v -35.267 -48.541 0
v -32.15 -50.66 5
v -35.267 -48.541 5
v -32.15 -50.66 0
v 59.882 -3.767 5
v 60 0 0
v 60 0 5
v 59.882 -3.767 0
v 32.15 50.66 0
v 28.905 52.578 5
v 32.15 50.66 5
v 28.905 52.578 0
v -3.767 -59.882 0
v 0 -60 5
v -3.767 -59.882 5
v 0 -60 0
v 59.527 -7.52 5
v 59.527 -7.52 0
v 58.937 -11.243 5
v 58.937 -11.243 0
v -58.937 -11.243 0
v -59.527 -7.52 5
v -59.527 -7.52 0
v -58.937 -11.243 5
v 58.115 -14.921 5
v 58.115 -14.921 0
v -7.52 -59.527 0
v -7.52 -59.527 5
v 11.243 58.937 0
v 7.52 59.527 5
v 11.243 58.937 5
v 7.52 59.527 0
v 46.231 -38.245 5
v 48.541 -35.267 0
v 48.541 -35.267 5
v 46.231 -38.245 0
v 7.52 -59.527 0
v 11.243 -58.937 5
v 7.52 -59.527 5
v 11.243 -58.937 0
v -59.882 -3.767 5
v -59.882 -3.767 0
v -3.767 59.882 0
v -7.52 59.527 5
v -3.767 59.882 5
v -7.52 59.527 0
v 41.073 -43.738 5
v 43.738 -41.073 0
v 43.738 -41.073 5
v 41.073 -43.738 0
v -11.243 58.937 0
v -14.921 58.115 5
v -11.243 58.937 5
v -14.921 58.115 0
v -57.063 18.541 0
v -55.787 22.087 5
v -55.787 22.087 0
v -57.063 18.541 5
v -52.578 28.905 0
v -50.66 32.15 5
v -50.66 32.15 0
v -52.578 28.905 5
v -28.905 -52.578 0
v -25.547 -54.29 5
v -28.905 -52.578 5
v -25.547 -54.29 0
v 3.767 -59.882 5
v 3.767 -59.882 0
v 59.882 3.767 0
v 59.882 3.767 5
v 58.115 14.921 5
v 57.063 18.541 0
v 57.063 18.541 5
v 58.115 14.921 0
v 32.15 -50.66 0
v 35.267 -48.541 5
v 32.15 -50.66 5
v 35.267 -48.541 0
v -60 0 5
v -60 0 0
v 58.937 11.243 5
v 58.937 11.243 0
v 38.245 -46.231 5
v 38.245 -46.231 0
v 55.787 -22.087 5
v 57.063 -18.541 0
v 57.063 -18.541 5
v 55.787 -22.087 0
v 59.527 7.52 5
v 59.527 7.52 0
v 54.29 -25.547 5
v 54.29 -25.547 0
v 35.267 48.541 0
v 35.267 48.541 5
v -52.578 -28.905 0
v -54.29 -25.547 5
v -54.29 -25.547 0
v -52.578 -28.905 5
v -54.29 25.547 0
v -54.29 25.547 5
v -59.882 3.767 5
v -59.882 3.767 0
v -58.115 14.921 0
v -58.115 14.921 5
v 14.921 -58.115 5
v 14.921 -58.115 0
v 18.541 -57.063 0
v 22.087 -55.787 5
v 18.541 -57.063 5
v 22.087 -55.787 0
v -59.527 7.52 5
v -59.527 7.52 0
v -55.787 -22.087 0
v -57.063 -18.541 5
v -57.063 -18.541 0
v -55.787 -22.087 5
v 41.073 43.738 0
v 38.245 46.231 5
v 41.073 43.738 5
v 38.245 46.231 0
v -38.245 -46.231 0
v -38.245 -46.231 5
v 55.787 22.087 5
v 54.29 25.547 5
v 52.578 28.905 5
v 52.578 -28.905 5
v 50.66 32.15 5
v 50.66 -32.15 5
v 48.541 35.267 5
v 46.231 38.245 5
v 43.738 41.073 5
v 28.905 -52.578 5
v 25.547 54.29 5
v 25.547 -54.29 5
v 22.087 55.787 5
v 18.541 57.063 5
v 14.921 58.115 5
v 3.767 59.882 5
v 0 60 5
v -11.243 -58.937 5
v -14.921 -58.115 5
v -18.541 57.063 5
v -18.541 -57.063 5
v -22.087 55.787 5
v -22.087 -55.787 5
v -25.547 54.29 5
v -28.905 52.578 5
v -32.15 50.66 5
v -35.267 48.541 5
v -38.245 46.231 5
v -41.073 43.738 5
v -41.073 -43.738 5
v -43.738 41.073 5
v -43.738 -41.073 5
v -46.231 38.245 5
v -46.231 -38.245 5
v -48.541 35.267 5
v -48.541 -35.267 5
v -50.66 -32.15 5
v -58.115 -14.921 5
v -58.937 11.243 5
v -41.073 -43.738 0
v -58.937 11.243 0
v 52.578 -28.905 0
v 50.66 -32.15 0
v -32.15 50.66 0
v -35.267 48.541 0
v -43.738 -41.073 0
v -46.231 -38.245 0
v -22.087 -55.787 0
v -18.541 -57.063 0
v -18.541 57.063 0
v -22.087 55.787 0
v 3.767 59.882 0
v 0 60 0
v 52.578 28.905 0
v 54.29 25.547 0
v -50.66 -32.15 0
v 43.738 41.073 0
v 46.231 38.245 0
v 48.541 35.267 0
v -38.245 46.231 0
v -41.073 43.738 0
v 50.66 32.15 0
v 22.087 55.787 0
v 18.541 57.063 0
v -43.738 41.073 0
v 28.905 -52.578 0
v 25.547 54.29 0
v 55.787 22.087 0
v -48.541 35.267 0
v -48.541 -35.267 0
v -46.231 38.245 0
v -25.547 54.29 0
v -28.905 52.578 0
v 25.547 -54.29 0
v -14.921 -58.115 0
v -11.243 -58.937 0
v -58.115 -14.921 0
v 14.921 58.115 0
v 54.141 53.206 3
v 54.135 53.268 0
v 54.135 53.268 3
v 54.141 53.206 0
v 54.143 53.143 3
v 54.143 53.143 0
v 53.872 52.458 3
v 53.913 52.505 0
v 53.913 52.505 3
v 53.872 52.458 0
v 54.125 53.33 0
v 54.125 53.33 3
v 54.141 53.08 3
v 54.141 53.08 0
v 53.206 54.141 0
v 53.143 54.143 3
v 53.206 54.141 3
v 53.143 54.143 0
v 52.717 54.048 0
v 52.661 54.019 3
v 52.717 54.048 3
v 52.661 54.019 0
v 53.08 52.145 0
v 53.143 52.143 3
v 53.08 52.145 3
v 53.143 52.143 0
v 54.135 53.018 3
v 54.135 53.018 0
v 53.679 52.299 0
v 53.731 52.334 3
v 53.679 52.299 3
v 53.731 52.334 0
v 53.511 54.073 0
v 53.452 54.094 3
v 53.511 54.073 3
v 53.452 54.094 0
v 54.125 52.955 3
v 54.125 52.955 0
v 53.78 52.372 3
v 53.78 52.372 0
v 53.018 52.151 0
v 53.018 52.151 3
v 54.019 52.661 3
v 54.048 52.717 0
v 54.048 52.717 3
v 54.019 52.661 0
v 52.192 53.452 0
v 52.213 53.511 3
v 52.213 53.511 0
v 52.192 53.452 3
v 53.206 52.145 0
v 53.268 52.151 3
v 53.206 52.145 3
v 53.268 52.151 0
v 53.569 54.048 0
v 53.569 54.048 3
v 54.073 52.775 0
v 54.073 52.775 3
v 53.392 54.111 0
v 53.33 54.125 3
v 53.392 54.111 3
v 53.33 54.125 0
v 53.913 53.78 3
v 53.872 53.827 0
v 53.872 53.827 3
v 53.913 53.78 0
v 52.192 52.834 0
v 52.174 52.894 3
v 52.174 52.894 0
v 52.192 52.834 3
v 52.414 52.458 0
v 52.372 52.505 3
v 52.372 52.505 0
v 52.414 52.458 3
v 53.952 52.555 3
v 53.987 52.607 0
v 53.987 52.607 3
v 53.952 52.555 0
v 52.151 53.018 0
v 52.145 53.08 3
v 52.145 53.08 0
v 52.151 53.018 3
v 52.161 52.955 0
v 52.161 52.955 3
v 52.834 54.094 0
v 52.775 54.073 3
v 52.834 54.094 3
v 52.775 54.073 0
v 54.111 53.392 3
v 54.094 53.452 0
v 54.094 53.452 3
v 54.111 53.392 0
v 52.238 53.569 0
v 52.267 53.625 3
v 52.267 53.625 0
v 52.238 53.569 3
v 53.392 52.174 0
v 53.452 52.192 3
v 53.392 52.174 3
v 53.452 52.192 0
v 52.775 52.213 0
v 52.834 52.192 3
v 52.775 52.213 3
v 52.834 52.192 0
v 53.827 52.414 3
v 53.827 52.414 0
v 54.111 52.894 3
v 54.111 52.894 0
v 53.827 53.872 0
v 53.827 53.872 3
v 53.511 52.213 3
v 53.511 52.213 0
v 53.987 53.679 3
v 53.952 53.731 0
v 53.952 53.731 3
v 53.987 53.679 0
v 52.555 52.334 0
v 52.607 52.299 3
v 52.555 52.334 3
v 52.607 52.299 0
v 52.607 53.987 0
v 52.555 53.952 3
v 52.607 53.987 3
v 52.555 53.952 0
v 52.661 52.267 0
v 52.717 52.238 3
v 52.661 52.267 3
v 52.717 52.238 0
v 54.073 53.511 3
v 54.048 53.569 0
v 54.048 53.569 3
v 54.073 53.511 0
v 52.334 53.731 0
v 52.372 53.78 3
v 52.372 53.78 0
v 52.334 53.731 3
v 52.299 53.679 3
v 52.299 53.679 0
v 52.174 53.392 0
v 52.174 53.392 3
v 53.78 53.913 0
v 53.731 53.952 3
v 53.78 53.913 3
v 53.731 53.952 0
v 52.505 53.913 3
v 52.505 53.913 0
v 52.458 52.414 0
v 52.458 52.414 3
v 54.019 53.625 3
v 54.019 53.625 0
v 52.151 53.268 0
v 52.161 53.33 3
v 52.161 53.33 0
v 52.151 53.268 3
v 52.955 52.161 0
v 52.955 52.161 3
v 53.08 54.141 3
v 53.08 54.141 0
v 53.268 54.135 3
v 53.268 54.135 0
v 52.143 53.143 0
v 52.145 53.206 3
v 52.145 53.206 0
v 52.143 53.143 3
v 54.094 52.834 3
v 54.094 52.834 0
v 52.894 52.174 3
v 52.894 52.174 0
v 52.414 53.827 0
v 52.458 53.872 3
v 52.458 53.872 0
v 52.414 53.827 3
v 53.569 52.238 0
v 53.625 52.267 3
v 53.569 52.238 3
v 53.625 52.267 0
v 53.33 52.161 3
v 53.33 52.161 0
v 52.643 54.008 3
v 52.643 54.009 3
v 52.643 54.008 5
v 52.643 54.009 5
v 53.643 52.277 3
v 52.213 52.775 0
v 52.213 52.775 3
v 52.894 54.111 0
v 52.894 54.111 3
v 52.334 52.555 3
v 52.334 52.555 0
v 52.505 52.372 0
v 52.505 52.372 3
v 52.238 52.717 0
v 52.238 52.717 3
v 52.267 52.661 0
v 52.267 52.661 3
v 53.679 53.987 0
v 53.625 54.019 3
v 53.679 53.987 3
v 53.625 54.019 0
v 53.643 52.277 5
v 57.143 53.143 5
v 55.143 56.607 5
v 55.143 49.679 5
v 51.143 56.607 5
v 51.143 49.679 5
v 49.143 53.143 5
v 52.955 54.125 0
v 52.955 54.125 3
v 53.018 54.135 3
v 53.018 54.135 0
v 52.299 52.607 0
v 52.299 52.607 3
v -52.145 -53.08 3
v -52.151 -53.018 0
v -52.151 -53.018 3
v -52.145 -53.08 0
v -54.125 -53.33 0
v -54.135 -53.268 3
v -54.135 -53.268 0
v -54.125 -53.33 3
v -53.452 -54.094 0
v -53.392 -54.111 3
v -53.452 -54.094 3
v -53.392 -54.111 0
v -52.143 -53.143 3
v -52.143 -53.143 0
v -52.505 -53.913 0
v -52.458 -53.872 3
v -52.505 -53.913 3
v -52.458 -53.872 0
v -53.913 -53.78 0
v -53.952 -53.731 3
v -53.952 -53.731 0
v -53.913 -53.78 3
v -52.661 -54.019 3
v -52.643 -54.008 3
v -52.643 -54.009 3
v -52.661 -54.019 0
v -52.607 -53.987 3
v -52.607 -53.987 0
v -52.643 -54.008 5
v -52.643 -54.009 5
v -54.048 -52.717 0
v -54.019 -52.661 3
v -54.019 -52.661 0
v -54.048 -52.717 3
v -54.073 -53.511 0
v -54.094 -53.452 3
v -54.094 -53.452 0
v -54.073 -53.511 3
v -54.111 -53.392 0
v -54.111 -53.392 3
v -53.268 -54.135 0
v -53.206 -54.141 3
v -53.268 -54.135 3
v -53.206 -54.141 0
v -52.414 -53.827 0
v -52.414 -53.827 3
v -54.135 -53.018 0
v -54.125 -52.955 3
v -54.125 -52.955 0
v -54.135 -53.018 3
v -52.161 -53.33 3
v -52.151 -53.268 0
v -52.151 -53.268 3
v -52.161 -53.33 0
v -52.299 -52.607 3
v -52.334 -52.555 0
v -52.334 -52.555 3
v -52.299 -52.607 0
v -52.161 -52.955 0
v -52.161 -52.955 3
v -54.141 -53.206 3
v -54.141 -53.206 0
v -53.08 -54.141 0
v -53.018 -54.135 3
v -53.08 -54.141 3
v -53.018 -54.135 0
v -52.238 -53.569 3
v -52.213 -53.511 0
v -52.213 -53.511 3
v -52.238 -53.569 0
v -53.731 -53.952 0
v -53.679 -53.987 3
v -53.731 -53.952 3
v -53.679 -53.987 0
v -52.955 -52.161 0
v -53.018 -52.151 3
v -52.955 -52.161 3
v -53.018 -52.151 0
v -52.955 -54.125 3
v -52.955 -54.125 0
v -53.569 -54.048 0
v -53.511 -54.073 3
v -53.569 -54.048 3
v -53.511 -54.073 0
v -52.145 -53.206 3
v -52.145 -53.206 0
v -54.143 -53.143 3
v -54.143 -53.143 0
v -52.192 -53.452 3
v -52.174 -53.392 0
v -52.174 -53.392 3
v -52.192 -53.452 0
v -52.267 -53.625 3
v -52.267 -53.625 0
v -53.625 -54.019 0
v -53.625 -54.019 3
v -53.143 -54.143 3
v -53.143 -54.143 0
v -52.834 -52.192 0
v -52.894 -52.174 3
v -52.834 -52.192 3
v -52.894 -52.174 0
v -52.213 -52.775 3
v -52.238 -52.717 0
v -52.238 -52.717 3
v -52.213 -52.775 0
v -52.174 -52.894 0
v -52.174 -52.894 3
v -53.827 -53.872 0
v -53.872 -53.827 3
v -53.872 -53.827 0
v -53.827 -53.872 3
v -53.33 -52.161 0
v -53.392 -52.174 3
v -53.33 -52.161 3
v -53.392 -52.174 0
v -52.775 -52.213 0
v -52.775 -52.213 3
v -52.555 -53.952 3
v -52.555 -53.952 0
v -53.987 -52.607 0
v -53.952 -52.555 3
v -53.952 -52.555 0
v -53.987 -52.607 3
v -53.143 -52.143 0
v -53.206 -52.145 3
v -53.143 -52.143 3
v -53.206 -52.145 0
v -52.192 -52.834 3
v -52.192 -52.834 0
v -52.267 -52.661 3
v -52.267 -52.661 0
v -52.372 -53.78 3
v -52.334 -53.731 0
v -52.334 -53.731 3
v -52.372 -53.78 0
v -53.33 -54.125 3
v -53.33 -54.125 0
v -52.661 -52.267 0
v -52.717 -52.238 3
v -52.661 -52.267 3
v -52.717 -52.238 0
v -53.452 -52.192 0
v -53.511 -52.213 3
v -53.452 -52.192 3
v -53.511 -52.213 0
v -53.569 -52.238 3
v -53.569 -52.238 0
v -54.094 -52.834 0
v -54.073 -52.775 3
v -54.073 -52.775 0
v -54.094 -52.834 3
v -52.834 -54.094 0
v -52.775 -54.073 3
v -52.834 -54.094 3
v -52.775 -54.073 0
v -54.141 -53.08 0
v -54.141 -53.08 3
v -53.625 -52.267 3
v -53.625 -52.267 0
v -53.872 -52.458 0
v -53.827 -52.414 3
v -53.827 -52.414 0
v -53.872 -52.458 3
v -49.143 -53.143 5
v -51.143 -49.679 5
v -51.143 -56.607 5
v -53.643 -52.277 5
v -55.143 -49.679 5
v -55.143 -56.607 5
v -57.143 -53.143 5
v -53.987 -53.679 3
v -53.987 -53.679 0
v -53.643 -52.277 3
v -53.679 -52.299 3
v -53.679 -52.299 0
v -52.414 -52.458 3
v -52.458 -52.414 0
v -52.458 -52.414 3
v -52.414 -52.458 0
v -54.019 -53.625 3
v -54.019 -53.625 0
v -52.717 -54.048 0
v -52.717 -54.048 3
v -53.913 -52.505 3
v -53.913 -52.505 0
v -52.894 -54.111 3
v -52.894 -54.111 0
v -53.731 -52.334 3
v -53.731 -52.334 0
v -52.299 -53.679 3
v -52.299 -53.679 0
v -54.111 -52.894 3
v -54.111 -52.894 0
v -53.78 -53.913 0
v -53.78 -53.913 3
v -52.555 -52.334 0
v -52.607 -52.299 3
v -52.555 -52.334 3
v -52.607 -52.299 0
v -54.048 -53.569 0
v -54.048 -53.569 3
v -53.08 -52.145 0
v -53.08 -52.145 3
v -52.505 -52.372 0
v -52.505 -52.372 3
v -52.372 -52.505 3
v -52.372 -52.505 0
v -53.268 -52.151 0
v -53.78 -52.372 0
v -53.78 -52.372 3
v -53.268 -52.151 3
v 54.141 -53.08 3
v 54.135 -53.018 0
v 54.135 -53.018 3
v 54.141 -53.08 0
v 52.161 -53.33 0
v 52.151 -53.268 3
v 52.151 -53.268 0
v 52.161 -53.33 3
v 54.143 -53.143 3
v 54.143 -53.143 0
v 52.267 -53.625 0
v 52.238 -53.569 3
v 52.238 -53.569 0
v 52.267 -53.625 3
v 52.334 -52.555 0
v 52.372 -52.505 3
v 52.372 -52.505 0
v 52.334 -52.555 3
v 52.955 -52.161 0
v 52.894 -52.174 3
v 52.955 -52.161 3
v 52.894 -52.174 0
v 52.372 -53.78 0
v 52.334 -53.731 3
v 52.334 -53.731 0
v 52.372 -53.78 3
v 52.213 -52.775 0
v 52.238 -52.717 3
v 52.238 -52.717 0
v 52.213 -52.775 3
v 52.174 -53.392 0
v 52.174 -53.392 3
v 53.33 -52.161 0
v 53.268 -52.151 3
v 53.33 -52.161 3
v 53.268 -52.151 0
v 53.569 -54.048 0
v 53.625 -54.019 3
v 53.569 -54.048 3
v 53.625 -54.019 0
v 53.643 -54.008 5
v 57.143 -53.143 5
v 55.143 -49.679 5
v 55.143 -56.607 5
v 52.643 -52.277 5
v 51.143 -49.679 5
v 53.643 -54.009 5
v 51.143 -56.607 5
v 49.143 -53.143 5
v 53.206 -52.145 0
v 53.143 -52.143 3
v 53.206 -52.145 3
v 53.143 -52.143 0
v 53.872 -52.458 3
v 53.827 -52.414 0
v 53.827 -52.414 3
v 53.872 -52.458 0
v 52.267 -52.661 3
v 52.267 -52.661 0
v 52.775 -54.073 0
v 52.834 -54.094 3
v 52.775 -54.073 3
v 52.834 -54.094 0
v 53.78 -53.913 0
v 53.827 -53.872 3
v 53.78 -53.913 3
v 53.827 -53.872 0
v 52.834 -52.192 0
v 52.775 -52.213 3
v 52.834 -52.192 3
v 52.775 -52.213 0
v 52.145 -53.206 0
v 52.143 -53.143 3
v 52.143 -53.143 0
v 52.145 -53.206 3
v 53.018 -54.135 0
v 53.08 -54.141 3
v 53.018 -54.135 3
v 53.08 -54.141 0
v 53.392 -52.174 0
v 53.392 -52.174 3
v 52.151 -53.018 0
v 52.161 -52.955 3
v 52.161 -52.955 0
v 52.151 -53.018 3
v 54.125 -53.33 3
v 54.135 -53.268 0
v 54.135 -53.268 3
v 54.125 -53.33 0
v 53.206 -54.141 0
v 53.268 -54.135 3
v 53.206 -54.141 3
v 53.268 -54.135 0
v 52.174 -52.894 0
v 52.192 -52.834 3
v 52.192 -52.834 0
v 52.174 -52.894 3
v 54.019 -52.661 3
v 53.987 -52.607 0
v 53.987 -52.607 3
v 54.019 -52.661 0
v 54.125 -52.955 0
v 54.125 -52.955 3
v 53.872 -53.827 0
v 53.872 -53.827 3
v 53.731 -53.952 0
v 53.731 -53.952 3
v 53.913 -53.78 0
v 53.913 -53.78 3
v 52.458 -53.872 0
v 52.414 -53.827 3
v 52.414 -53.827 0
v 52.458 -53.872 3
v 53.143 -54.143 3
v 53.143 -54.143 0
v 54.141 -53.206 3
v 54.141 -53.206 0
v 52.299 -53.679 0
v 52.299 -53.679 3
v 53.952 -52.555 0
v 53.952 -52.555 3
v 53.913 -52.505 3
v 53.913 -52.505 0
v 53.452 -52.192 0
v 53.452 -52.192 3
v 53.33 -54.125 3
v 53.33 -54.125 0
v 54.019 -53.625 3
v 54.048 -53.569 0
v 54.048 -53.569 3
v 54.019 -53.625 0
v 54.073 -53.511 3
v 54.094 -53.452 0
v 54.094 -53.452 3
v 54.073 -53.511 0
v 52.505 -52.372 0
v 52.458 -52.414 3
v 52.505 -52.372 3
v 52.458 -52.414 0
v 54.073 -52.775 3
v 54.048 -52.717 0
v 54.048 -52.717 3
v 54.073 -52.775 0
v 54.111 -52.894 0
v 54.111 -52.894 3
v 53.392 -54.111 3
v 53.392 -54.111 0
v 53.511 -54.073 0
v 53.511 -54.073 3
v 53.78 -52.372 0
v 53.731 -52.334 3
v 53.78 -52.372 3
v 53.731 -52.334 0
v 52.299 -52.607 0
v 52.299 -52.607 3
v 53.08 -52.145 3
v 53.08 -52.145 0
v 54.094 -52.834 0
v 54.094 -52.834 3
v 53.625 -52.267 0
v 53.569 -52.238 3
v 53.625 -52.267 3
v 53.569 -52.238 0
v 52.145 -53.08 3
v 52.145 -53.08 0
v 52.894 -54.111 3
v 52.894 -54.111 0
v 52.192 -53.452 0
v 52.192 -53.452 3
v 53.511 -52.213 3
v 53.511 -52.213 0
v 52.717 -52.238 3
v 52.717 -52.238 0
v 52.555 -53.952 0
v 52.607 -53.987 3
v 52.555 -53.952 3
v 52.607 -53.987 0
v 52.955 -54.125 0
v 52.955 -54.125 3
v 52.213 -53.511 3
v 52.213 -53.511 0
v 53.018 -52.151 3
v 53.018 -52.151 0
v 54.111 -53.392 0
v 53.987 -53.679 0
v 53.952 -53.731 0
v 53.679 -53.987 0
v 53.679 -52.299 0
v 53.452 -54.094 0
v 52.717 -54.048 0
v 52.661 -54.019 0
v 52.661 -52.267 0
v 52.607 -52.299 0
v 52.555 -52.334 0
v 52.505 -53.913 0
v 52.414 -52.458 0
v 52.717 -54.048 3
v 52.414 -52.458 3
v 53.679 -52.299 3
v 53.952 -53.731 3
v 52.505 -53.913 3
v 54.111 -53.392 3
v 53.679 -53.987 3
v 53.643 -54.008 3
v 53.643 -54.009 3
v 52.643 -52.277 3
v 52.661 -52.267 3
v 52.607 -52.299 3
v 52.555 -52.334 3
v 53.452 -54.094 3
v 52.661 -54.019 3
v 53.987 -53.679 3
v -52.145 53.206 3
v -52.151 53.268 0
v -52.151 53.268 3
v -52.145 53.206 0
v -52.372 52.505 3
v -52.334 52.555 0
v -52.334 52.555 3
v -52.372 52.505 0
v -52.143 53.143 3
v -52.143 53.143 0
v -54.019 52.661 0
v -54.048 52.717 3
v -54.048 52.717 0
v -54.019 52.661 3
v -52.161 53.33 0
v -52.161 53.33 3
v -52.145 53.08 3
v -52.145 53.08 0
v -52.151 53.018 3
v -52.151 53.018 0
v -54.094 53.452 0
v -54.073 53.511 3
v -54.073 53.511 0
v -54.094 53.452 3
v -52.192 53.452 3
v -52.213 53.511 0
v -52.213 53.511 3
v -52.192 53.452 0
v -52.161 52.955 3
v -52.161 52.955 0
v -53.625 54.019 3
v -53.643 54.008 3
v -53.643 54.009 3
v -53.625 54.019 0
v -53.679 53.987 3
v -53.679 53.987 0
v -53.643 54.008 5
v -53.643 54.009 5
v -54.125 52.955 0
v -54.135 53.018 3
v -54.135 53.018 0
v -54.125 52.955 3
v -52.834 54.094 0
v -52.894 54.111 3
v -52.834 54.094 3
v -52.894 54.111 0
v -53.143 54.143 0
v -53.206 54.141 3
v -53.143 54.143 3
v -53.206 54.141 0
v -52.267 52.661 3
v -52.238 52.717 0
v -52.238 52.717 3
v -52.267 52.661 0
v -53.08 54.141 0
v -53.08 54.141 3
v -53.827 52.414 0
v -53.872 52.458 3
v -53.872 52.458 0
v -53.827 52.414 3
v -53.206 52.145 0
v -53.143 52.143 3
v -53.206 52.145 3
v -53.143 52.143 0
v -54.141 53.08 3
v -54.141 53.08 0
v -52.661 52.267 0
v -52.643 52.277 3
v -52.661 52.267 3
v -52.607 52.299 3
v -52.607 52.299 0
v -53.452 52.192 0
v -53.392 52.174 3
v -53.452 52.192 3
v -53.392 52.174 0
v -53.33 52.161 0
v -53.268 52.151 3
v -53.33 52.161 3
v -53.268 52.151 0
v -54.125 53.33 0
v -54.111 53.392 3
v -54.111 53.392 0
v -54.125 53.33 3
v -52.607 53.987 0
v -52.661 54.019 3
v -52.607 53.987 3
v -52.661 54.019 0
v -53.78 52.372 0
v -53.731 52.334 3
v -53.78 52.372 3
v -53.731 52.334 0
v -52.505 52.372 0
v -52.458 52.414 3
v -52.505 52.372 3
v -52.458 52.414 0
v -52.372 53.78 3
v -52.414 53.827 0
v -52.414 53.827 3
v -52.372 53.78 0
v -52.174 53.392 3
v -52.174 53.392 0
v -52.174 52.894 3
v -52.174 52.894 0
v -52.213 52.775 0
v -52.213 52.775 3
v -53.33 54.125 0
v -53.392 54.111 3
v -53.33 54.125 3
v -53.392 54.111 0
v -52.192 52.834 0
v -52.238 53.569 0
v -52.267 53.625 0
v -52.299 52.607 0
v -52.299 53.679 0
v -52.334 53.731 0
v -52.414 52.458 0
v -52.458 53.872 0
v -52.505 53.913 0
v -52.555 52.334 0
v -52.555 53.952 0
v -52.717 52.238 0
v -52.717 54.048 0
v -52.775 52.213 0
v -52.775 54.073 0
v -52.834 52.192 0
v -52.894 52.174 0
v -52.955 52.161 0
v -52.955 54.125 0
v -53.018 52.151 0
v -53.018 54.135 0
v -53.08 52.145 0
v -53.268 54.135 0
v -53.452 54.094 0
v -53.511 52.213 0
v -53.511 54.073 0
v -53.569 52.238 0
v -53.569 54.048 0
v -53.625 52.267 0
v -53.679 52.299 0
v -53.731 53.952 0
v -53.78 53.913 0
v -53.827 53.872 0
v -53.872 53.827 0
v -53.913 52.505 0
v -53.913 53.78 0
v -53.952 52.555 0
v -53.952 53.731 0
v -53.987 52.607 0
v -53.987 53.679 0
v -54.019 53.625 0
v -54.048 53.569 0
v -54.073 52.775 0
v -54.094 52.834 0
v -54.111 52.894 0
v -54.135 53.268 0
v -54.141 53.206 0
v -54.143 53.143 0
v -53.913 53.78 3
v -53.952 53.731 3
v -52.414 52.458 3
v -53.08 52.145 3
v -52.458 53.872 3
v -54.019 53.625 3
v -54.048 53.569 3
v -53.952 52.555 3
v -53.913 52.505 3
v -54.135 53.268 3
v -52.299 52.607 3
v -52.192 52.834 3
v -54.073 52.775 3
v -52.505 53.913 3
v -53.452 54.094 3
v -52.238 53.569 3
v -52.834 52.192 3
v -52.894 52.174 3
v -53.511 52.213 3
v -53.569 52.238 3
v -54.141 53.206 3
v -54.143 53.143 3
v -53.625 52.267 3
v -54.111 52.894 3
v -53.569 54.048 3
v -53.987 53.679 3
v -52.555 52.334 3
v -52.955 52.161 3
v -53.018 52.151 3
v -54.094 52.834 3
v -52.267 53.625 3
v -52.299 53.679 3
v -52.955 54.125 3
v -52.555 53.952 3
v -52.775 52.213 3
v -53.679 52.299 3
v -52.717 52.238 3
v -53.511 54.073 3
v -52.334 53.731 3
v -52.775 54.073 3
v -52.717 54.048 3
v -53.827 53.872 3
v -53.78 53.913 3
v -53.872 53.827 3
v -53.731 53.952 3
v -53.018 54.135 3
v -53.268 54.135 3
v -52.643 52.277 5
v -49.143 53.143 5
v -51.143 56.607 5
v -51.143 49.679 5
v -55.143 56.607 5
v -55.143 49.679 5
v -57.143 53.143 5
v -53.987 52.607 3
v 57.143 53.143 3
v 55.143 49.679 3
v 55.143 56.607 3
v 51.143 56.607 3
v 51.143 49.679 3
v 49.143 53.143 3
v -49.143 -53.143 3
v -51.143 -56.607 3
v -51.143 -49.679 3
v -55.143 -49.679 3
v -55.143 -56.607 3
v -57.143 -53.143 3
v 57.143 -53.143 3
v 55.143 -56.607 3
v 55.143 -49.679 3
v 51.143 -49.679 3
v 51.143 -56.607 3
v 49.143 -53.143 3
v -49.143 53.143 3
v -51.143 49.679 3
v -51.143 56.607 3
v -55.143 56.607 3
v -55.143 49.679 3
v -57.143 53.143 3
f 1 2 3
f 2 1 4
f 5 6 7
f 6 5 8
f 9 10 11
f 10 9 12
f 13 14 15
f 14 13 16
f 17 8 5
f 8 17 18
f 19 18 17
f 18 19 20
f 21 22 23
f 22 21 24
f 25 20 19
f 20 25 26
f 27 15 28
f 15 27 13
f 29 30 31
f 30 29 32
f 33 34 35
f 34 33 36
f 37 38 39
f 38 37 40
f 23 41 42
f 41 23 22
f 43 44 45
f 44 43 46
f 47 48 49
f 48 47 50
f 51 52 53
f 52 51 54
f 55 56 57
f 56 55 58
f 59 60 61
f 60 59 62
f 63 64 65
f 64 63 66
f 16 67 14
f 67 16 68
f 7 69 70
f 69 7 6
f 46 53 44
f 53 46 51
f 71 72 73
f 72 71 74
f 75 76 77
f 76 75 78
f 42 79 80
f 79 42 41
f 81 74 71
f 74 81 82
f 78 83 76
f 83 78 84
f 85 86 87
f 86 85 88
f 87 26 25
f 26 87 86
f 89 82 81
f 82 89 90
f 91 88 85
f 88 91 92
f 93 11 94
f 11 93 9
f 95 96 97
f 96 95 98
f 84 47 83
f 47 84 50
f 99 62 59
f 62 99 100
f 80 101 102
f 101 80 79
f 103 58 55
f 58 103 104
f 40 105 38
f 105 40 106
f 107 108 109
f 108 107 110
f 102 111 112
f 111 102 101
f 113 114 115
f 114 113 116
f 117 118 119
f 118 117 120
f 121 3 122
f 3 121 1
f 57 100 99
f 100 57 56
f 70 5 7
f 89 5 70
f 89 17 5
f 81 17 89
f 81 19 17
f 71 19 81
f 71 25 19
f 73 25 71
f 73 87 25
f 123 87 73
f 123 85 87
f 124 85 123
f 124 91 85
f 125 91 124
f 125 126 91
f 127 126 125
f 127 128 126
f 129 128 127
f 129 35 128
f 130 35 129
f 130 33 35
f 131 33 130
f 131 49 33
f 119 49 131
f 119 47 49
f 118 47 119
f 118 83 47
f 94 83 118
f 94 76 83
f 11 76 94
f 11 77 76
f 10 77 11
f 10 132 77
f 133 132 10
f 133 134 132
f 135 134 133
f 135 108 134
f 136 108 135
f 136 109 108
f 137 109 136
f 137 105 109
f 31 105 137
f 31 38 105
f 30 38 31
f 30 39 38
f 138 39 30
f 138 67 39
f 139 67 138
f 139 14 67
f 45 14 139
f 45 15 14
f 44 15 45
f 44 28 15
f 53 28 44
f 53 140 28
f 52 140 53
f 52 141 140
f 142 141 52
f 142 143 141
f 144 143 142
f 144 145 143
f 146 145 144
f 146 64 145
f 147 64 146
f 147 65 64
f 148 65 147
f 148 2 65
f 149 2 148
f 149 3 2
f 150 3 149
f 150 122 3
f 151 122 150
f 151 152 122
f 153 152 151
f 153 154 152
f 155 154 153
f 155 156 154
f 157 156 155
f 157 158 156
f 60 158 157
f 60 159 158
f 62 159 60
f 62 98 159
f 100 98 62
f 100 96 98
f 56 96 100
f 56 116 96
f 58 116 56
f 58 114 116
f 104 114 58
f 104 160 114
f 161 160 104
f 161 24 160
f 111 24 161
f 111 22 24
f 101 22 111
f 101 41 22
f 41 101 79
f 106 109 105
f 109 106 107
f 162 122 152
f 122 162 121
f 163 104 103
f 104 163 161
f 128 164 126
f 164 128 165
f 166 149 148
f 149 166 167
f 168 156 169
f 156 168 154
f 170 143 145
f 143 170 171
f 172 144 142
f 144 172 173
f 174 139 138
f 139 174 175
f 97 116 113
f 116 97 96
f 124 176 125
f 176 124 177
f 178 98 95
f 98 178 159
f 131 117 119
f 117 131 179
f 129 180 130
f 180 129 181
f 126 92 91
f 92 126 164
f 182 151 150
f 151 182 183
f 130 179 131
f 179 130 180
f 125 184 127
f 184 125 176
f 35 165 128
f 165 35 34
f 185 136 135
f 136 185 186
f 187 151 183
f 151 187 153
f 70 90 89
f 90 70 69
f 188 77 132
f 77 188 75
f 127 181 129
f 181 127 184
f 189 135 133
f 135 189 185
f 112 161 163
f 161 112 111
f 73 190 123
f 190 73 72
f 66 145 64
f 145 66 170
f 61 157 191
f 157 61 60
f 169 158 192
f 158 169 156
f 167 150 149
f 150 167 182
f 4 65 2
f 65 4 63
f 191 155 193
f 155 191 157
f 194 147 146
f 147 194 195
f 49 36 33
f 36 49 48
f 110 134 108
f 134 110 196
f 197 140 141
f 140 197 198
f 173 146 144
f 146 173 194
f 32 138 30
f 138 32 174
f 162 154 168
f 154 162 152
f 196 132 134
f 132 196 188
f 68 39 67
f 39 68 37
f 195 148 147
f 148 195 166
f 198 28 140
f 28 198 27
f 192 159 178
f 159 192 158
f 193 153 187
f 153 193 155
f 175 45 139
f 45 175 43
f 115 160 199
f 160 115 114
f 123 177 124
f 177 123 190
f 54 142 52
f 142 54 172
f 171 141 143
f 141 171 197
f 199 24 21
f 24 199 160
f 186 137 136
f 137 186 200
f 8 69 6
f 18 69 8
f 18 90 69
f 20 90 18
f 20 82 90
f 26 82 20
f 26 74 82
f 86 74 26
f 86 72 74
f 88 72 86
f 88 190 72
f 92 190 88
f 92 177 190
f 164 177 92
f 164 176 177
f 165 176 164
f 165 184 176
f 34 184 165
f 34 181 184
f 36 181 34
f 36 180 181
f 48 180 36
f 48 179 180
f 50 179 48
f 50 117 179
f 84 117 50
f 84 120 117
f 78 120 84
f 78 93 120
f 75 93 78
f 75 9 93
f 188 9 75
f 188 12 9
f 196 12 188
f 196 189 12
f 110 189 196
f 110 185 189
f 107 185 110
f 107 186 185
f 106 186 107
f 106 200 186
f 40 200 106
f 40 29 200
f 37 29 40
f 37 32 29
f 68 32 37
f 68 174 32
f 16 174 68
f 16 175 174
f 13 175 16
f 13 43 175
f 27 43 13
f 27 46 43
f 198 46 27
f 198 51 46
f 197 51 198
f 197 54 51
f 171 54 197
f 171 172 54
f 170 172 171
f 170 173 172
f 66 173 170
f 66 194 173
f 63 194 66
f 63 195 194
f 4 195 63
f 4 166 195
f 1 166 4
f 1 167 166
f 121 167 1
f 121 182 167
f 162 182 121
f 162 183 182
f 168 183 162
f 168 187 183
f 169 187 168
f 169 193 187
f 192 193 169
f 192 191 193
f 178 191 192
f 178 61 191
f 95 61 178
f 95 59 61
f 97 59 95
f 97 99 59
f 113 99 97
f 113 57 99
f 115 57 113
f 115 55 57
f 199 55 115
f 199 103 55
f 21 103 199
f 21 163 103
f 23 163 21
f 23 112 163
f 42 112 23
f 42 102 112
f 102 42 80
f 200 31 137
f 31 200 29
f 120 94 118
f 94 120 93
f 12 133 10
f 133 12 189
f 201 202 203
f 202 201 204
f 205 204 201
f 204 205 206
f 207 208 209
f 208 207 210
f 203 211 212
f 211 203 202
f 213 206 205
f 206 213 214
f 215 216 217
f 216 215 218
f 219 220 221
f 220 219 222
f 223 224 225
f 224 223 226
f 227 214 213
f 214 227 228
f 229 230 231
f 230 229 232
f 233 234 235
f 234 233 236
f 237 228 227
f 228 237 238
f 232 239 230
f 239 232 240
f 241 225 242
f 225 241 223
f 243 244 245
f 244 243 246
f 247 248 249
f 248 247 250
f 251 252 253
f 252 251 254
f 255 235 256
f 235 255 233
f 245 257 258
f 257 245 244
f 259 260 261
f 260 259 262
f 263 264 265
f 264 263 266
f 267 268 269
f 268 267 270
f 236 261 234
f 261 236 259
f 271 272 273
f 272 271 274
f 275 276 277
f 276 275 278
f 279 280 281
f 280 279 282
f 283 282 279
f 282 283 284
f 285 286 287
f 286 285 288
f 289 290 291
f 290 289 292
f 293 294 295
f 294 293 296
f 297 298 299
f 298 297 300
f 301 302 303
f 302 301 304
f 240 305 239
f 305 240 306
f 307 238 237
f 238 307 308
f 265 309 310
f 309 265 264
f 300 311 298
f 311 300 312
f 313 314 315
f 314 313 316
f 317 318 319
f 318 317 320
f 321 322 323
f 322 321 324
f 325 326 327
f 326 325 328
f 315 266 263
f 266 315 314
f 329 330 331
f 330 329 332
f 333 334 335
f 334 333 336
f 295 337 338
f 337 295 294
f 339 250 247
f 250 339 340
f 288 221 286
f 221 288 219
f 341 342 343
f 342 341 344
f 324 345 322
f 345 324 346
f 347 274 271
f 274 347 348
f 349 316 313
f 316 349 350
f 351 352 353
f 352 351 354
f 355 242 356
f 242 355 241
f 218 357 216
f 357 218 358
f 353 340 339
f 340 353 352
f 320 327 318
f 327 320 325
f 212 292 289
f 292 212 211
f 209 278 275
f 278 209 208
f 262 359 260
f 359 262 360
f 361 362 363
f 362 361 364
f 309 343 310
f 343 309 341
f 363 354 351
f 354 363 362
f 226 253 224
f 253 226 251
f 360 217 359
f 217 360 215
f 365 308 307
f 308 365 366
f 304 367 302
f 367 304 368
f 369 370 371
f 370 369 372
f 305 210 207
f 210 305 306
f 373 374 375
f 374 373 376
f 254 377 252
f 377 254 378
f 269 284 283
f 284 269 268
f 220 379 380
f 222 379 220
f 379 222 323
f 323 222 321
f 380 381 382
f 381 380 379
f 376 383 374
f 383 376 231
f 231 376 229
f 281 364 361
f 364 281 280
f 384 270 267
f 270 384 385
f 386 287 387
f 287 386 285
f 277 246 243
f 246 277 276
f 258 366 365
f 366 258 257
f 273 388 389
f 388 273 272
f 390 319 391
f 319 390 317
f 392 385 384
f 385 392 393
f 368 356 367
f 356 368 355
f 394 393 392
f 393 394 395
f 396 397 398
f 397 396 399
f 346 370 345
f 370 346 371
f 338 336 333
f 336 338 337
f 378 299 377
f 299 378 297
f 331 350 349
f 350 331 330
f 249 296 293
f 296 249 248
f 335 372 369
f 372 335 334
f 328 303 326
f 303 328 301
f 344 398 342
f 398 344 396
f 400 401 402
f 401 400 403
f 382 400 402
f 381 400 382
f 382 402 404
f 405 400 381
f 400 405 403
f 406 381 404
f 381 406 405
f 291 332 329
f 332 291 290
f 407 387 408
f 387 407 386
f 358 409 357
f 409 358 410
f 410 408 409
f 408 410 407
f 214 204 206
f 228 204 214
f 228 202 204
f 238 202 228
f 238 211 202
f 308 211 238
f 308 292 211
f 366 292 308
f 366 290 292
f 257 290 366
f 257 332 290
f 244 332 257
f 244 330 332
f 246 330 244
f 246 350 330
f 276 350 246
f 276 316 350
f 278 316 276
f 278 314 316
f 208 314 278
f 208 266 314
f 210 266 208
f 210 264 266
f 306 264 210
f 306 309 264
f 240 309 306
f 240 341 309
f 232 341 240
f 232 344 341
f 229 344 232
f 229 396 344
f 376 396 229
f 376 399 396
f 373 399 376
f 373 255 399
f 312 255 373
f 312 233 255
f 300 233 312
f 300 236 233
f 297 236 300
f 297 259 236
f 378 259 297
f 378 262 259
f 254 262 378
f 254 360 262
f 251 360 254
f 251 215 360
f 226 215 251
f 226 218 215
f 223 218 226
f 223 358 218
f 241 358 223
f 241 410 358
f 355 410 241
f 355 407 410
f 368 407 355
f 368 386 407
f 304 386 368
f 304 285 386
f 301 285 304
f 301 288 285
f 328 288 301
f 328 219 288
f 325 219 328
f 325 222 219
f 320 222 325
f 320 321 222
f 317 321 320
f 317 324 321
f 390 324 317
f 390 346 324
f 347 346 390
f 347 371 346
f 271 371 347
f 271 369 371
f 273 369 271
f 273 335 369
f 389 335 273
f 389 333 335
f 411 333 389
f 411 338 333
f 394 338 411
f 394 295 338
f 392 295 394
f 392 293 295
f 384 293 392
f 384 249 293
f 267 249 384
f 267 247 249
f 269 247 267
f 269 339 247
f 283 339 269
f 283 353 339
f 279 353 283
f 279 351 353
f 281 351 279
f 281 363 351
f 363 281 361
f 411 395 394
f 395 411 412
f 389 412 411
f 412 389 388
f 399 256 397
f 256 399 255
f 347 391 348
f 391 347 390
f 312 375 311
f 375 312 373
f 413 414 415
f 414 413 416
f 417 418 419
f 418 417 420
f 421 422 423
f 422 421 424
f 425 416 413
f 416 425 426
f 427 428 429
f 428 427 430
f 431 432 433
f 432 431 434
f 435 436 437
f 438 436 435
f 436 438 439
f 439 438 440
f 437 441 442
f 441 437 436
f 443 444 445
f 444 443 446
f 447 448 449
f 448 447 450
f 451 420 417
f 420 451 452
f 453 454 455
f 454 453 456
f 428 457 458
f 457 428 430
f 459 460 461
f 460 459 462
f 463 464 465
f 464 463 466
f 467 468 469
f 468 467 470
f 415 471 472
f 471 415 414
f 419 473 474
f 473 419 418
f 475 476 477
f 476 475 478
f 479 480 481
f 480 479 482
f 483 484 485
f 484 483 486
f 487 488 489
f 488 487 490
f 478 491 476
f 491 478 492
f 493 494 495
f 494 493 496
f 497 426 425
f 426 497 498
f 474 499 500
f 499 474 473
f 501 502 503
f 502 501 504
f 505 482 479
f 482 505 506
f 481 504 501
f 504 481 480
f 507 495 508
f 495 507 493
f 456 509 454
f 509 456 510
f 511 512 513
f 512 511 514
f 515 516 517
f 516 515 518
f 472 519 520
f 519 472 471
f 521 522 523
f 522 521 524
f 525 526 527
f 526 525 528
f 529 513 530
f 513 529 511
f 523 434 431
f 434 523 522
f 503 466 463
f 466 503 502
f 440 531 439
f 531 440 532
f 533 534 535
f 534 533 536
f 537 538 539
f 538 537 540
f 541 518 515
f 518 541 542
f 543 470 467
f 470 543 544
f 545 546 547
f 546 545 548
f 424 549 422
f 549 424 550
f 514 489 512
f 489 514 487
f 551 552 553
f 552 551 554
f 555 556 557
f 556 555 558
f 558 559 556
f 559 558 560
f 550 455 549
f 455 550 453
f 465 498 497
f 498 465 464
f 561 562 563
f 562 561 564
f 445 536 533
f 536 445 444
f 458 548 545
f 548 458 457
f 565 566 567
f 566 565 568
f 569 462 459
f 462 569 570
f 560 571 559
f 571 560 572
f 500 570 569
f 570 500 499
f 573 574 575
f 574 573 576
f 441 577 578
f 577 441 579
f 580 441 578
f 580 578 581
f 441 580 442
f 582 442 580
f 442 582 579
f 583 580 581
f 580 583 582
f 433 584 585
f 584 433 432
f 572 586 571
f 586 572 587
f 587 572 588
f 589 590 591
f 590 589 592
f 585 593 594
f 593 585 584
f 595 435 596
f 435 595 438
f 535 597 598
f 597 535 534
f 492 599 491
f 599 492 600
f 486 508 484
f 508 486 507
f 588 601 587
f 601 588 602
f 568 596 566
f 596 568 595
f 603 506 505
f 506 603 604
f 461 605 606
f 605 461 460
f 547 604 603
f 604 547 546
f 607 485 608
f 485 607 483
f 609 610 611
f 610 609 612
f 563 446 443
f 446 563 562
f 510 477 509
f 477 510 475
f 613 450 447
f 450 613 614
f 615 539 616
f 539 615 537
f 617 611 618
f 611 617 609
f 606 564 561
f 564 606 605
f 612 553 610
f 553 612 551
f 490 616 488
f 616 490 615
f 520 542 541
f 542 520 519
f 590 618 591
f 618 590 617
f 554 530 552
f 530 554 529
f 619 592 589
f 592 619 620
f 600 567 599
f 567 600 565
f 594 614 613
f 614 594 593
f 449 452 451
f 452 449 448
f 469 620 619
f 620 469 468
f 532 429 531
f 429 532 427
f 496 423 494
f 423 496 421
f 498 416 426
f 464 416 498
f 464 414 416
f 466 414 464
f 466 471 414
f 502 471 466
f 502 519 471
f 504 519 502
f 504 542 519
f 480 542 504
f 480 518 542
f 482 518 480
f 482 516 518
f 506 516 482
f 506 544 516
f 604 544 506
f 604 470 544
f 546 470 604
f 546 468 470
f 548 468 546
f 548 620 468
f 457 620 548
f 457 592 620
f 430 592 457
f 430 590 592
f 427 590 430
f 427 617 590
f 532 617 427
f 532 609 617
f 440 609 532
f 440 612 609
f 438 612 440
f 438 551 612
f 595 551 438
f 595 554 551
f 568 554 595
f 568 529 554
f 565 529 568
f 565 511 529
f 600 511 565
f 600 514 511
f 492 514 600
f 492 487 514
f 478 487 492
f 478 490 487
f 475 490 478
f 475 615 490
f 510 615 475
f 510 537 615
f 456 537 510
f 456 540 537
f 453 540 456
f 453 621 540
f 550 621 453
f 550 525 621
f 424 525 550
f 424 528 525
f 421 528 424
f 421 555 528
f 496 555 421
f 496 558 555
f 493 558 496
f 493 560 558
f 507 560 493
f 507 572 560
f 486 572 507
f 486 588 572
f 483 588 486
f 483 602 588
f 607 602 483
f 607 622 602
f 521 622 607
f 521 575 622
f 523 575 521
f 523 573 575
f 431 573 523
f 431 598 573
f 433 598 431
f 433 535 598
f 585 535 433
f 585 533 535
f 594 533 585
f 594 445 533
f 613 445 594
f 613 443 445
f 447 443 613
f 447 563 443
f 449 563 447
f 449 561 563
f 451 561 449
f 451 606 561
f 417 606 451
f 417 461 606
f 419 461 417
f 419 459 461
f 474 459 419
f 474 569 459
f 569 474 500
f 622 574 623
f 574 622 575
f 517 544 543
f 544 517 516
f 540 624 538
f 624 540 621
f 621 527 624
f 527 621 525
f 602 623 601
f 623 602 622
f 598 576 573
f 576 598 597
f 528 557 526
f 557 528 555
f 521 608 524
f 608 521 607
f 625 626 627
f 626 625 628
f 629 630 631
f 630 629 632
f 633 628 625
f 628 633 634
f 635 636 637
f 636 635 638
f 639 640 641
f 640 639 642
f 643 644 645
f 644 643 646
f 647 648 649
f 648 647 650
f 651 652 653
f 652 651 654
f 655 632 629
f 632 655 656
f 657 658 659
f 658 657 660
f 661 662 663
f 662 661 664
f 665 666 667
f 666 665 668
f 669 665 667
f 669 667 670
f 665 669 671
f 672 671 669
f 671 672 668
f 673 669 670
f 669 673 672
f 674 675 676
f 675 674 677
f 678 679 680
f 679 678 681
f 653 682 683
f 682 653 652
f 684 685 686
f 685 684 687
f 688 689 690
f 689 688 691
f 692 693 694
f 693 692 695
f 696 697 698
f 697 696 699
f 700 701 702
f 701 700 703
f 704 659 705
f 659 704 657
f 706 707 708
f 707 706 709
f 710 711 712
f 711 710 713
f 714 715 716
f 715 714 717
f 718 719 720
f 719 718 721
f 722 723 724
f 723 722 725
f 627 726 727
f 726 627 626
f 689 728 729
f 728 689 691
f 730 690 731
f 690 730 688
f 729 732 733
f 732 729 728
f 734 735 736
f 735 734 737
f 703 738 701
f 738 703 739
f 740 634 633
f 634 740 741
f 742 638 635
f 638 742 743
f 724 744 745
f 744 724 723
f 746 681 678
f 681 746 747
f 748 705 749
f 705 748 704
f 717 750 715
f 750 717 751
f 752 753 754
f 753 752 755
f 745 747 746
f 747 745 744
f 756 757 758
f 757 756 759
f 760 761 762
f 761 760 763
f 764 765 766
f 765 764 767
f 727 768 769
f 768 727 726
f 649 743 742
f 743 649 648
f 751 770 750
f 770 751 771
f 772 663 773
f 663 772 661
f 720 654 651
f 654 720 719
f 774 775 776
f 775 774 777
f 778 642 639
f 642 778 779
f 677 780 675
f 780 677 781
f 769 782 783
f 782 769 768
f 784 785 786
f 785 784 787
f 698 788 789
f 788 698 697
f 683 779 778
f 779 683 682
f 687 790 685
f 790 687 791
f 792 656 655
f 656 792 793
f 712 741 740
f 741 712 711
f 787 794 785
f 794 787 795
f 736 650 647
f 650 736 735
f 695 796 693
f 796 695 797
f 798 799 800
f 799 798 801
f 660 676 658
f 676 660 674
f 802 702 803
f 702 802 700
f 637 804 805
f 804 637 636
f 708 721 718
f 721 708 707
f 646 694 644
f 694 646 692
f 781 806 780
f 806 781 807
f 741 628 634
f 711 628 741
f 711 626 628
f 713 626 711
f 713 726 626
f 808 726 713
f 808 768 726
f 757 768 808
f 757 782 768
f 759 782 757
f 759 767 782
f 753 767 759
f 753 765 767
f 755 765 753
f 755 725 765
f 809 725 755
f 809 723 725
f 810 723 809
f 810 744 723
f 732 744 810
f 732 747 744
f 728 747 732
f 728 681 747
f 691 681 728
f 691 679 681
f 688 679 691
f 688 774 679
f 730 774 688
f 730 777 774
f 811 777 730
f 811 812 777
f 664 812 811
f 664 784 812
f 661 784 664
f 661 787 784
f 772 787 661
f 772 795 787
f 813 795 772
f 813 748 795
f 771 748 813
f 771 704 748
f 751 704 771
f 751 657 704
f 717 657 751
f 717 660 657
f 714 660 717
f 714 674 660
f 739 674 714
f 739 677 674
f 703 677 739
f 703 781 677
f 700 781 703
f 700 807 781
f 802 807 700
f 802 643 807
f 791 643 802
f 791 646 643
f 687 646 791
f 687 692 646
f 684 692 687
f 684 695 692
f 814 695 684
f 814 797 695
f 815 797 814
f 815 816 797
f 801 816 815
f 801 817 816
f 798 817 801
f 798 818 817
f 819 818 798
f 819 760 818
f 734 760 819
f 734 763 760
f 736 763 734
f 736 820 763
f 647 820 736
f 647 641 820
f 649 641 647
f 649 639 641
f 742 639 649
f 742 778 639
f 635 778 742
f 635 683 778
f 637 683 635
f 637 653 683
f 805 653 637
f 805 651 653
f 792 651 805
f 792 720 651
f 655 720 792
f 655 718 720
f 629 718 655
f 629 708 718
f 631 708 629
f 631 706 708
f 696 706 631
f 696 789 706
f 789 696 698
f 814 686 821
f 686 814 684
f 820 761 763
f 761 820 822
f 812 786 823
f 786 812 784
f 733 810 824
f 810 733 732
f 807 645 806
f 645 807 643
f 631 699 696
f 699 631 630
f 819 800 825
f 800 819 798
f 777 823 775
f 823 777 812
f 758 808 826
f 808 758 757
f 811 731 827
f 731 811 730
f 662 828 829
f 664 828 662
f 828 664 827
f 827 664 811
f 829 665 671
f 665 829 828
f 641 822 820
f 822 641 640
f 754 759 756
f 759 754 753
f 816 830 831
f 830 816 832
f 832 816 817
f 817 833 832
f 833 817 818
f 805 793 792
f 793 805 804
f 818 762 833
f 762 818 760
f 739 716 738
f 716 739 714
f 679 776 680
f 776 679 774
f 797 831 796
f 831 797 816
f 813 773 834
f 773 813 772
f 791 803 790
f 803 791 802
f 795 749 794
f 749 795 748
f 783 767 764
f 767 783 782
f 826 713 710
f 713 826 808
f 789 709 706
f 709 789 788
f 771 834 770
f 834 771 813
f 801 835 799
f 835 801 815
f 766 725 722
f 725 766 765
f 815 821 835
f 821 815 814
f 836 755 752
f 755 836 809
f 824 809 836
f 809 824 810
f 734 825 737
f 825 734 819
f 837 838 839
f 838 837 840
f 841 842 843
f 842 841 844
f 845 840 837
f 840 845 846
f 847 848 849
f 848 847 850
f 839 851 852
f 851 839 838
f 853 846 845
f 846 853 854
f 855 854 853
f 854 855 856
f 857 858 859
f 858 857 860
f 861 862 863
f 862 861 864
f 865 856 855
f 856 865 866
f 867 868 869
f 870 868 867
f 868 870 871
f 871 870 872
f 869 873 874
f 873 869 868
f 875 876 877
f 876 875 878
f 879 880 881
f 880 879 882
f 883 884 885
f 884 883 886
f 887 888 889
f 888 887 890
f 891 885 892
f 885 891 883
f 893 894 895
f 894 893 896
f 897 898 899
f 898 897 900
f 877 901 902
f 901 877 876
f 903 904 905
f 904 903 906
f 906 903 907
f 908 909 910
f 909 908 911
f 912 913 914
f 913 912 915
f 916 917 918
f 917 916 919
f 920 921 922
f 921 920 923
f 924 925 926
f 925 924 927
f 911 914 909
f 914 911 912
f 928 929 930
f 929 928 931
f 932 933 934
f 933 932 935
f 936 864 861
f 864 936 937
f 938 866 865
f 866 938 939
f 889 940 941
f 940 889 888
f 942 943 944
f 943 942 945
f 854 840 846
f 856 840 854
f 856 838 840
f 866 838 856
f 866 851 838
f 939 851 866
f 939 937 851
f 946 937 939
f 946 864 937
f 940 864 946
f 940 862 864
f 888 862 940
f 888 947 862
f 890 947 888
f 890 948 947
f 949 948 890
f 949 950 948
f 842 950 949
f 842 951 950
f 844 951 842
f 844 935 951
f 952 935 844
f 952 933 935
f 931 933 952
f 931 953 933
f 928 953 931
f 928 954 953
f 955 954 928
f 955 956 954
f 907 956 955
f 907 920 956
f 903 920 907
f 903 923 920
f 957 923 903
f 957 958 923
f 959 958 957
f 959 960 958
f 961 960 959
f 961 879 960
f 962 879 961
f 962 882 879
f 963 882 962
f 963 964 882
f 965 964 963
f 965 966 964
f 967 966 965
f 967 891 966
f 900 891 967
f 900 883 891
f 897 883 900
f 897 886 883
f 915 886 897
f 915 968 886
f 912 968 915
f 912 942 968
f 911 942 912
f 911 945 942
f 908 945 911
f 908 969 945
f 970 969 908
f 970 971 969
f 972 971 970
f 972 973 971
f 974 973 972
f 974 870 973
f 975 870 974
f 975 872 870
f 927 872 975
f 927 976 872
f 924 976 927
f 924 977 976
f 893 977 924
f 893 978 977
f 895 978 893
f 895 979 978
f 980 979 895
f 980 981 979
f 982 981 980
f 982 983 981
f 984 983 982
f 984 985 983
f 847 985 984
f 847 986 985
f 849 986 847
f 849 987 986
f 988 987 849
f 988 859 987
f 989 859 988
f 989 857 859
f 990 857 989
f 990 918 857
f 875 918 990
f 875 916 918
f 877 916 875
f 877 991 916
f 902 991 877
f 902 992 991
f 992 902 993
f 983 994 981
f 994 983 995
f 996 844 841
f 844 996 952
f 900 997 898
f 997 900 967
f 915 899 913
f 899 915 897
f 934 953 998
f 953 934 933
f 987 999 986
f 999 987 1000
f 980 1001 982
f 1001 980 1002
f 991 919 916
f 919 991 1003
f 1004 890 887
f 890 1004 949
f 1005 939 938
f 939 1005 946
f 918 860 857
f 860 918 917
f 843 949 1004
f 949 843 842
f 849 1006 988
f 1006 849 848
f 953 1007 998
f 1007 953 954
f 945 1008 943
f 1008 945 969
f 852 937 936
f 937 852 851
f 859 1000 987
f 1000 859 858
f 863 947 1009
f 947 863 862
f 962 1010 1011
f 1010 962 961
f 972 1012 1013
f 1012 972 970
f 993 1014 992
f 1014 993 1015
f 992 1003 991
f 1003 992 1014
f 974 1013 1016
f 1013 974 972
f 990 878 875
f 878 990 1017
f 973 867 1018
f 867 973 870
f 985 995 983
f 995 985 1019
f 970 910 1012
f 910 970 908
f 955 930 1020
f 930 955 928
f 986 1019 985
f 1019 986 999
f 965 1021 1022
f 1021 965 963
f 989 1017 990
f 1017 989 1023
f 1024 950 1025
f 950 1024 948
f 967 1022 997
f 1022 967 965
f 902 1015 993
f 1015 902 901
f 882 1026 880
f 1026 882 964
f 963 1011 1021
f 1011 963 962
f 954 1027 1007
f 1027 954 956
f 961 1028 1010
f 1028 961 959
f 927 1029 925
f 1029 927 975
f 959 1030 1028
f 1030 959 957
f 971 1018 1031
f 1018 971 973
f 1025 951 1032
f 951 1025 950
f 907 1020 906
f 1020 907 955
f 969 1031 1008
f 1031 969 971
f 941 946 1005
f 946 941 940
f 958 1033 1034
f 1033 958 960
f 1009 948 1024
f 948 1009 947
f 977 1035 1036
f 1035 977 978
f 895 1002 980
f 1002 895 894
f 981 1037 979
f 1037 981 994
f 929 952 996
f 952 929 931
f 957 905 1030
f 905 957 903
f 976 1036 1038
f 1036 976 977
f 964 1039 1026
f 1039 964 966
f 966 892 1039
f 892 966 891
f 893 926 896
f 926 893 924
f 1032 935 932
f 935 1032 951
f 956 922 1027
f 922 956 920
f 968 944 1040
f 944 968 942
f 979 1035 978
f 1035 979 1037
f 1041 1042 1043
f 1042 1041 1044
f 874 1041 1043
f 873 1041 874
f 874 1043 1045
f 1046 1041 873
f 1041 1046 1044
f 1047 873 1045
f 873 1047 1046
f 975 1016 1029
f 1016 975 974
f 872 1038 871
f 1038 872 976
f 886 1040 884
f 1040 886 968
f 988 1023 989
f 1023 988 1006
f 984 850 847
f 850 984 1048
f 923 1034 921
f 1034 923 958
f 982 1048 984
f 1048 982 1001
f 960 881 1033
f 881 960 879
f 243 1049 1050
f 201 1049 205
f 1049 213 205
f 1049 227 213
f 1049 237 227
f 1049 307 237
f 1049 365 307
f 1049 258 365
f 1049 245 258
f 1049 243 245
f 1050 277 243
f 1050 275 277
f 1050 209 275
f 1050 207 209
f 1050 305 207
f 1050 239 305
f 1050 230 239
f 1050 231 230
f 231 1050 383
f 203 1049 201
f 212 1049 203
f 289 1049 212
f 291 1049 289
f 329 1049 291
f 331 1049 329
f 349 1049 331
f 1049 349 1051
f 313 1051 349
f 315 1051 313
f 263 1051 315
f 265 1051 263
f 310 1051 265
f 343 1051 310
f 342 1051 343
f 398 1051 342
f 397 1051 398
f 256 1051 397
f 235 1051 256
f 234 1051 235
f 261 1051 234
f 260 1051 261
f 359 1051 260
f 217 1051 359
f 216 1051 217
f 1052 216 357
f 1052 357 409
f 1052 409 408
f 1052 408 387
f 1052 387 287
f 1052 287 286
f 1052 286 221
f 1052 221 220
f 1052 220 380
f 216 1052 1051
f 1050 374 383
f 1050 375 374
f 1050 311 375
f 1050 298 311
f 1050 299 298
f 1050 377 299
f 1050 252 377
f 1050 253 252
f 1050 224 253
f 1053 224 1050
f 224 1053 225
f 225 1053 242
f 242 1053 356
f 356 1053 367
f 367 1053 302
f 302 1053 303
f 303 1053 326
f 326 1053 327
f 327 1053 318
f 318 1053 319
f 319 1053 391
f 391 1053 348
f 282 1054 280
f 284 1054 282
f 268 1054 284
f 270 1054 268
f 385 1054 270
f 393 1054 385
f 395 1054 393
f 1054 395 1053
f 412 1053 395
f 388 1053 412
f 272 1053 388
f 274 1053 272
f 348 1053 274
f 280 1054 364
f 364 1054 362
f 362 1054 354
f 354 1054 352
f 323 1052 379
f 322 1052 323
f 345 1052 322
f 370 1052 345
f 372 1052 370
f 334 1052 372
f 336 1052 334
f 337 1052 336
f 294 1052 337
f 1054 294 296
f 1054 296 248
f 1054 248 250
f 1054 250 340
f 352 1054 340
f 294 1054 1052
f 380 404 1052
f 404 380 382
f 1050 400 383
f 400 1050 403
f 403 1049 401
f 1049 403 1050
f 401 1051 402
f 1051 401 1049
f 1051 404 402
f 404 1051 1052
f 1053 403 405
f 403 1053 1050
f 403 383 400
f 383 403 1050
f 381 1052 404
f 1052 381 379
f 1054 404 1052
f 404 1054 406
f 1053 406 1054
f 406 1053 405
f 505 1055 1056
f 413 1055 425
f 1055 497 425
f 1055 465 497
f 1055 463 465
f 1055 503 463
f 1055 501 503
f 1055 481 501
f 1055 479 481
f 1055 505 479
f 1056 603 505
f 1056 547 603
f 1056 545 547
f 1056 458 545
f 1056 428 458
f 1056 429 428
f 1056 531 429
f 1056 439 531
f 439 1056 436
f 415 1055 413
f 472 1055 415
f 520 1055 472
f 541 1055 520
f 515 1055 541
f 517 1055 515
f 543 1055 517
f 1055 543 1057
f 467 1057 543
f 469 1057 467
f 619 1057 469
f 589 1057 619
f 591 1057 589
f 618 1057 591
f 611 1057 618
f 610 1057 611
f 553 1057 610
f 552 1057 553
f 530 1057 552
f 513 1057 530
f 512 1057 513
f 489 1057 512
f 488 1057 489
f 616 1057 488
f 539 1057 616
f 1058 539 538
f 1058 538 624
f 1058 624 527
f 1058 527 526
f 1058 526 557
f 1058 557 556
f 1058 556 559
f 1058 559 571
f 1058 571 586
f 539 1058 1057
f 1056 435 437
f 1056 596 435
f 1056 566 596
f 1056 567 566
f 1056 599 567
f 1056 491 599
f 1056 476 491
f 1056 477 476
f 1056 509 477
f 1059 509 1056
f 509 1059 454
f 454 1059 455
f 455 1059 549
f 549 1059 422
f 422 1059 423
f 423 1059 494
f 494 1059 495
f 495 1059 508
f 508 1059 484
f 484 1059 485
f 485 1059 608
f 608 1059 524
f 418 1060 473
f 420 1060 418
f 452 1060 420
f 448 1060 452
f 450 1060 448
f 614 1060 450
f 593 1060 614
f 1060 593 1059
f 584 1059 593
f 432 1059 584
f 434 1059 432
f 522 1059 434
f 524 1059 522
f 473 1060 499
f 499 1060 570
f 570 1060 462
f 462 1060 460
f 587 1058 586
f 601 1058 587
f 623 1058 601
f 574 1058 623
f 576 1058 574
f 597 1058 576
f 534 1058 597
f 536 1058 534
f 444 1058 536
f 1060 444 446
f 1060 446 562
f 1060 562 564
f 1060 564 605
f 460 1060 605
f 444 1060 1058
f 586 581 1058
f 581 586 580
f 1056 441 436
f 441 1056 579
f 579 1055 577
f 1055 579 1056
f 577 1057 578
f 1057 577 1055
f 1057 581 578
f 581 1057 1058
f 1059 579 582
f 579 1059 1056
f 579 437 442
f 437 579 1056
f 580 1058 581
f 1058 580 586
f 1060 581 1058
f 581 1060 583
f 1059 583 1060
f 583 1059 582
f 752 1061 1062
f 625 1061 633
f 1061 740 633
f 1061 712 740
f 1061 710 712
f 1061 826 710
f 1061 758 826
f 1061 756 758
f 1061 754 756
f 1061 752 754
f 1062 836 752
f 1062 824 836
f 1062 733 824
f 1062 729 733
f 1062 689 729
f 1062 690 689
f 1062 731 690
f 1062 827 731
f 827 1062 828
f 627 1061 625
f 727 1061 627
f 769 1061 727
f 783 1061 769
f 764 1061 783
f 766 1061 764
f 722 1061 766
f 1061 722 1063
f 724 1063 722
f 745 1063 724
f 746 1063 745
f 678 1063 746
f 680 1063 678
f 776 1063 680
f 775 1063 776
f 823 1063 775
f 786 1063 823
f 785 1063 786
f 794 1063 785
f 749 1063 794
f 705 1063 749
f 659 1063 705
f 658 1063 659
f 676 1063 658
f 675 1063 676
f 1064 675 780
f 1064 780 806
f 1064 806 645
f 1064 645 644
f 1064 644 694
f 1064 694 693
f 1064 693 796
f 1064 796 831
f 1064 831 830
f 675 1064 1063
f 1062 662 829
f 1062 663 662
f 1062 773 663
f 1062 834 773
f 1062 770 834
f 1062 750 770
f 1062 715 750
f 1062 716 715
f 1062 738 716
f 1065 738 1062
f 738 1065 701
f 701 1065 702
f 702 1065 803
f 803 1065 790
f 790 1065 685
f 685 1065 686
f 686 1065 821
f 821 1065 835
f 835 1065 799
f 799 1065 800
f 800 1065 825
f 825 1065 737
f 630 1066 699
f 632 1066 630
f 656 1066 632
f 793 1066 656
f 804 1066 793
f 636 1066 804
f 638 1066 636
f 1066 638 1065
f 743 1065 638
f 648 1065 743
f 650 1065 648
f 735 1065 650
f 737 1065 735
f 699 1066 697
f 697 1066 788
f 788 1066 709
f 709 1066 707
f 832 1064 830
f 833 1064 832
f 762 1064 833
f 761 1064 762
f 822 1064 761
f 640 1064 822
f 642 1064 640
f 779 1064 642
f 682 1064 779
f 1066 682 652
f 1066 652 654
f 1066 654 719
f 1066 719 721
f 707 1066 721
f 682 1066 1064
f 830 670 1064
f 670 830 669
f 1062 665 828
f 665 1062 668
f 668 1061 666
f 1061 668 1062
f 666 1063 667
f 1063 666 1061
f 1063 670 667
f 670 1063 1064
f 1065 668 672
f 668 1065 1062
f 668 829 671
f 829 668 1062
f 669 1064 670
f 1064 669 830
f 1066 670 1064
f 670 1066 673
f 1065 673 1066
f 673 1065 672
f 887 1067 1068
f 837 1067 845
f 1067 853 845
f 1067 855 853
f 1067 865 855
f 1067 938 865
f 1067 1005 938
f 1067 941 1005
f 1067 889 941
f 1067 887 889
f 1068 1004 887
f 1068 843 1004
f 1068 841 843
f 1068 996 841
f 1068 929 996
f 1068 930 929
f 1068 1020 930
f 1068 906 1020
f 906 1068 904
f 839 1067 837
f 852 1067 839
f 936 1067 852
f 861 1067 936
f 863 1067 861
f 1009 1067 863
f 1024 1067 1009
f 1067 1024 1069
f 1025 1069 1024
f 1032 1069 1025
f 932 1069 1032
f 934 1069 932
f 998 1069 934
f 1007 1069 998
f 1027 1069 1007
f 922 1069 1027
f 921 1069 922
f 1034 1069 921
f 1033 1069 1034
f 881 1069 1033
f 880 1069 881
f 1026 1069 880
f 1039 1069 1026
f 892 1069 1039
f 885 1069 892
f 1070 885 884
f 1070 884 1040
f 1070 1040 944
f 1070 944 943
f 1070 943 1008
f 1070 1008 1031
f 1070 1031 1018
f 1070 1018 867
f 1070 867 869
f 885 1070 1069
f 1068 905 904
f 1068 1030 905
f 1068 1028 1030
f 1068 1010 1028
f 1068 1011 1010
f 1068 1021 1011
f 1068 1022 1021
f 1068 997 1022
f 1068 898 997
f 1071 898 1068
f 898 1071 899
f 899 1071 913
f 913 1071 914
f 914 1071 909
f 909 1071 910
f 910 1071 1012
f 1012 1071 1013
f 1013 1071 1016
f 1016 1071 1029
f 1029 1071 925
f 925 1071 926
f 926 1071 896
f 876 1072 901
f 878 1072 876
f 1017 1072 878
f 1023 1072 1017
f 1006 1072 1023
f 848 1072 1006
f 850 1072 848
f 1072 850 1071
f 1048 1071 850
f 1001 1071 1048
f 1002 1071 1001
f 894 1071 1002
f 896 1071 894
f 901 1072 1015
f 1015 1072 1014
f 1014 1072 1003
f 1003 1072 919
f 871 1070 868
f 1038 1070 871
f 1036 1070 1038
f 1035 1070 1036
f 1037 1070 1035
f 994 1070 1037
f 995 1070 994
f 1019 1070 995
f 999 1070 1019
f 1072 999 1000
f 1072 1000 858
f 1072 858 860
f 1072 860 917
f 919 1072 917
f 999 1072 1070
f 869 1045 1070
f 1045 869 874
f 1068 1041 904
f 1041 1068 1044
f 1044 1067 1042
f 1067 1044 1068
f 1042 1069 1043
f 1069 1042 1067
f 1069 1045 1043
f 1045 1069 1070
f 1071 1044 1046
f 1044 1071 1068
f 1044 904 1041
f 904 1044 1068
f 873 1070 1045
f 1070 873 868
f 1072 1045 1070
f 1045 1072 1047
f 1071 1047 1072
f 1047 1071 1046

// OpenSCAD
// file: hex_nut.scad
// 1.5^2 + y^2 = 3^2
// sqrt(3^2 - 1.5^2)
//       30
//    /   |
// 60  - 90
// cos(30) = x / 3
// x = 3 cos(30)
module hex(side_length=4) {
  points = [[0,0], [side_length, 0], [side_length / 2, side_length * cos(30)]];
  for (i=[0:1:5]) {
    rotate([0,0,i * 60]) polygon(points);
  }
}

module hex_nut(side_length=3, height=2) {
    linear_extrude(height=height) hex(side_length);

}
// main file
use <hex_nut.scad>
$fn = 100;

module fan(
    radius,
    depth,
    screw_radius,
    distance_to_middle_of_circle_x = "None",
    distance_to_middle_of_circle_y = "None"
) {
  _distance_to_middle_of_circle_x = (distance_to_middle_of_circle_x == "None" || distance_to_middle_of_circle_y == "None") ? 62 / 70 * radius : distance_to_middle_of_circle_x;
  _distance_to_middle_of_circle_y = (distance_to_middle_of_circle_x == "None" || distance_to_middle_of_circle_y == "None") ? 62 / 70 * radius : distance_to_middle_of_circle_y;

  linear_extrude(height=depth) circle(radius);
  translate([_distance_to_middle_of_circle_x, _distance_to_middle_of_circle_y, 0]) {
    linear_extrude(height=depth) circle(screw_radius);
  }

  translate([-_distance_to_middle_of_circle_x, -_distance_to_middle_of_circle_y, 0]) {
    linear_extrude(height=depth) circle(screw_radius);
  }

  translate([_distance_to_middle_of_circle_x, -_distance_to_middle_of_circle_y, 0]) {
    linear_extrude(height=depth) circle(screw_radius);
  }

  translate([-_distance_to_middle_of_circle_x, _distance_to_middle_of_circle_y, 0]) {
    linear_extrude(height=depth) circle(screw_radius);
  }

  // hex nut 1
  translate([_distance_to_middle_of_circle_x, _distance_to_middle_of_circle_y, depth - 2]) {
    hex_nut(4);
  }

  // hex nut 2
  translate([-_distance_to_middle_of_circle_x, -_distance_to_middle_of_circle_y, depth - 2]) {
    hex_nut(4);
  }

  // hex nut 3
  translate([_distance_to_middle_of_circle_x, -_distance_to_middle_of_circle_y, depth - 2]) {
    hex_nut(4);
  }

  // hex nut 4
  translate([-_distance_to_middle_of_circle_x, _distance_to_middle_of_circle_y, depth - 2]) {
    hex_nut(4);
  }
}

fan(radius=60, depth=5, distance_to_middle_of_circle_x=62/70 * 60, distance_to_middle_of_circle_y=62/70 * 60);
